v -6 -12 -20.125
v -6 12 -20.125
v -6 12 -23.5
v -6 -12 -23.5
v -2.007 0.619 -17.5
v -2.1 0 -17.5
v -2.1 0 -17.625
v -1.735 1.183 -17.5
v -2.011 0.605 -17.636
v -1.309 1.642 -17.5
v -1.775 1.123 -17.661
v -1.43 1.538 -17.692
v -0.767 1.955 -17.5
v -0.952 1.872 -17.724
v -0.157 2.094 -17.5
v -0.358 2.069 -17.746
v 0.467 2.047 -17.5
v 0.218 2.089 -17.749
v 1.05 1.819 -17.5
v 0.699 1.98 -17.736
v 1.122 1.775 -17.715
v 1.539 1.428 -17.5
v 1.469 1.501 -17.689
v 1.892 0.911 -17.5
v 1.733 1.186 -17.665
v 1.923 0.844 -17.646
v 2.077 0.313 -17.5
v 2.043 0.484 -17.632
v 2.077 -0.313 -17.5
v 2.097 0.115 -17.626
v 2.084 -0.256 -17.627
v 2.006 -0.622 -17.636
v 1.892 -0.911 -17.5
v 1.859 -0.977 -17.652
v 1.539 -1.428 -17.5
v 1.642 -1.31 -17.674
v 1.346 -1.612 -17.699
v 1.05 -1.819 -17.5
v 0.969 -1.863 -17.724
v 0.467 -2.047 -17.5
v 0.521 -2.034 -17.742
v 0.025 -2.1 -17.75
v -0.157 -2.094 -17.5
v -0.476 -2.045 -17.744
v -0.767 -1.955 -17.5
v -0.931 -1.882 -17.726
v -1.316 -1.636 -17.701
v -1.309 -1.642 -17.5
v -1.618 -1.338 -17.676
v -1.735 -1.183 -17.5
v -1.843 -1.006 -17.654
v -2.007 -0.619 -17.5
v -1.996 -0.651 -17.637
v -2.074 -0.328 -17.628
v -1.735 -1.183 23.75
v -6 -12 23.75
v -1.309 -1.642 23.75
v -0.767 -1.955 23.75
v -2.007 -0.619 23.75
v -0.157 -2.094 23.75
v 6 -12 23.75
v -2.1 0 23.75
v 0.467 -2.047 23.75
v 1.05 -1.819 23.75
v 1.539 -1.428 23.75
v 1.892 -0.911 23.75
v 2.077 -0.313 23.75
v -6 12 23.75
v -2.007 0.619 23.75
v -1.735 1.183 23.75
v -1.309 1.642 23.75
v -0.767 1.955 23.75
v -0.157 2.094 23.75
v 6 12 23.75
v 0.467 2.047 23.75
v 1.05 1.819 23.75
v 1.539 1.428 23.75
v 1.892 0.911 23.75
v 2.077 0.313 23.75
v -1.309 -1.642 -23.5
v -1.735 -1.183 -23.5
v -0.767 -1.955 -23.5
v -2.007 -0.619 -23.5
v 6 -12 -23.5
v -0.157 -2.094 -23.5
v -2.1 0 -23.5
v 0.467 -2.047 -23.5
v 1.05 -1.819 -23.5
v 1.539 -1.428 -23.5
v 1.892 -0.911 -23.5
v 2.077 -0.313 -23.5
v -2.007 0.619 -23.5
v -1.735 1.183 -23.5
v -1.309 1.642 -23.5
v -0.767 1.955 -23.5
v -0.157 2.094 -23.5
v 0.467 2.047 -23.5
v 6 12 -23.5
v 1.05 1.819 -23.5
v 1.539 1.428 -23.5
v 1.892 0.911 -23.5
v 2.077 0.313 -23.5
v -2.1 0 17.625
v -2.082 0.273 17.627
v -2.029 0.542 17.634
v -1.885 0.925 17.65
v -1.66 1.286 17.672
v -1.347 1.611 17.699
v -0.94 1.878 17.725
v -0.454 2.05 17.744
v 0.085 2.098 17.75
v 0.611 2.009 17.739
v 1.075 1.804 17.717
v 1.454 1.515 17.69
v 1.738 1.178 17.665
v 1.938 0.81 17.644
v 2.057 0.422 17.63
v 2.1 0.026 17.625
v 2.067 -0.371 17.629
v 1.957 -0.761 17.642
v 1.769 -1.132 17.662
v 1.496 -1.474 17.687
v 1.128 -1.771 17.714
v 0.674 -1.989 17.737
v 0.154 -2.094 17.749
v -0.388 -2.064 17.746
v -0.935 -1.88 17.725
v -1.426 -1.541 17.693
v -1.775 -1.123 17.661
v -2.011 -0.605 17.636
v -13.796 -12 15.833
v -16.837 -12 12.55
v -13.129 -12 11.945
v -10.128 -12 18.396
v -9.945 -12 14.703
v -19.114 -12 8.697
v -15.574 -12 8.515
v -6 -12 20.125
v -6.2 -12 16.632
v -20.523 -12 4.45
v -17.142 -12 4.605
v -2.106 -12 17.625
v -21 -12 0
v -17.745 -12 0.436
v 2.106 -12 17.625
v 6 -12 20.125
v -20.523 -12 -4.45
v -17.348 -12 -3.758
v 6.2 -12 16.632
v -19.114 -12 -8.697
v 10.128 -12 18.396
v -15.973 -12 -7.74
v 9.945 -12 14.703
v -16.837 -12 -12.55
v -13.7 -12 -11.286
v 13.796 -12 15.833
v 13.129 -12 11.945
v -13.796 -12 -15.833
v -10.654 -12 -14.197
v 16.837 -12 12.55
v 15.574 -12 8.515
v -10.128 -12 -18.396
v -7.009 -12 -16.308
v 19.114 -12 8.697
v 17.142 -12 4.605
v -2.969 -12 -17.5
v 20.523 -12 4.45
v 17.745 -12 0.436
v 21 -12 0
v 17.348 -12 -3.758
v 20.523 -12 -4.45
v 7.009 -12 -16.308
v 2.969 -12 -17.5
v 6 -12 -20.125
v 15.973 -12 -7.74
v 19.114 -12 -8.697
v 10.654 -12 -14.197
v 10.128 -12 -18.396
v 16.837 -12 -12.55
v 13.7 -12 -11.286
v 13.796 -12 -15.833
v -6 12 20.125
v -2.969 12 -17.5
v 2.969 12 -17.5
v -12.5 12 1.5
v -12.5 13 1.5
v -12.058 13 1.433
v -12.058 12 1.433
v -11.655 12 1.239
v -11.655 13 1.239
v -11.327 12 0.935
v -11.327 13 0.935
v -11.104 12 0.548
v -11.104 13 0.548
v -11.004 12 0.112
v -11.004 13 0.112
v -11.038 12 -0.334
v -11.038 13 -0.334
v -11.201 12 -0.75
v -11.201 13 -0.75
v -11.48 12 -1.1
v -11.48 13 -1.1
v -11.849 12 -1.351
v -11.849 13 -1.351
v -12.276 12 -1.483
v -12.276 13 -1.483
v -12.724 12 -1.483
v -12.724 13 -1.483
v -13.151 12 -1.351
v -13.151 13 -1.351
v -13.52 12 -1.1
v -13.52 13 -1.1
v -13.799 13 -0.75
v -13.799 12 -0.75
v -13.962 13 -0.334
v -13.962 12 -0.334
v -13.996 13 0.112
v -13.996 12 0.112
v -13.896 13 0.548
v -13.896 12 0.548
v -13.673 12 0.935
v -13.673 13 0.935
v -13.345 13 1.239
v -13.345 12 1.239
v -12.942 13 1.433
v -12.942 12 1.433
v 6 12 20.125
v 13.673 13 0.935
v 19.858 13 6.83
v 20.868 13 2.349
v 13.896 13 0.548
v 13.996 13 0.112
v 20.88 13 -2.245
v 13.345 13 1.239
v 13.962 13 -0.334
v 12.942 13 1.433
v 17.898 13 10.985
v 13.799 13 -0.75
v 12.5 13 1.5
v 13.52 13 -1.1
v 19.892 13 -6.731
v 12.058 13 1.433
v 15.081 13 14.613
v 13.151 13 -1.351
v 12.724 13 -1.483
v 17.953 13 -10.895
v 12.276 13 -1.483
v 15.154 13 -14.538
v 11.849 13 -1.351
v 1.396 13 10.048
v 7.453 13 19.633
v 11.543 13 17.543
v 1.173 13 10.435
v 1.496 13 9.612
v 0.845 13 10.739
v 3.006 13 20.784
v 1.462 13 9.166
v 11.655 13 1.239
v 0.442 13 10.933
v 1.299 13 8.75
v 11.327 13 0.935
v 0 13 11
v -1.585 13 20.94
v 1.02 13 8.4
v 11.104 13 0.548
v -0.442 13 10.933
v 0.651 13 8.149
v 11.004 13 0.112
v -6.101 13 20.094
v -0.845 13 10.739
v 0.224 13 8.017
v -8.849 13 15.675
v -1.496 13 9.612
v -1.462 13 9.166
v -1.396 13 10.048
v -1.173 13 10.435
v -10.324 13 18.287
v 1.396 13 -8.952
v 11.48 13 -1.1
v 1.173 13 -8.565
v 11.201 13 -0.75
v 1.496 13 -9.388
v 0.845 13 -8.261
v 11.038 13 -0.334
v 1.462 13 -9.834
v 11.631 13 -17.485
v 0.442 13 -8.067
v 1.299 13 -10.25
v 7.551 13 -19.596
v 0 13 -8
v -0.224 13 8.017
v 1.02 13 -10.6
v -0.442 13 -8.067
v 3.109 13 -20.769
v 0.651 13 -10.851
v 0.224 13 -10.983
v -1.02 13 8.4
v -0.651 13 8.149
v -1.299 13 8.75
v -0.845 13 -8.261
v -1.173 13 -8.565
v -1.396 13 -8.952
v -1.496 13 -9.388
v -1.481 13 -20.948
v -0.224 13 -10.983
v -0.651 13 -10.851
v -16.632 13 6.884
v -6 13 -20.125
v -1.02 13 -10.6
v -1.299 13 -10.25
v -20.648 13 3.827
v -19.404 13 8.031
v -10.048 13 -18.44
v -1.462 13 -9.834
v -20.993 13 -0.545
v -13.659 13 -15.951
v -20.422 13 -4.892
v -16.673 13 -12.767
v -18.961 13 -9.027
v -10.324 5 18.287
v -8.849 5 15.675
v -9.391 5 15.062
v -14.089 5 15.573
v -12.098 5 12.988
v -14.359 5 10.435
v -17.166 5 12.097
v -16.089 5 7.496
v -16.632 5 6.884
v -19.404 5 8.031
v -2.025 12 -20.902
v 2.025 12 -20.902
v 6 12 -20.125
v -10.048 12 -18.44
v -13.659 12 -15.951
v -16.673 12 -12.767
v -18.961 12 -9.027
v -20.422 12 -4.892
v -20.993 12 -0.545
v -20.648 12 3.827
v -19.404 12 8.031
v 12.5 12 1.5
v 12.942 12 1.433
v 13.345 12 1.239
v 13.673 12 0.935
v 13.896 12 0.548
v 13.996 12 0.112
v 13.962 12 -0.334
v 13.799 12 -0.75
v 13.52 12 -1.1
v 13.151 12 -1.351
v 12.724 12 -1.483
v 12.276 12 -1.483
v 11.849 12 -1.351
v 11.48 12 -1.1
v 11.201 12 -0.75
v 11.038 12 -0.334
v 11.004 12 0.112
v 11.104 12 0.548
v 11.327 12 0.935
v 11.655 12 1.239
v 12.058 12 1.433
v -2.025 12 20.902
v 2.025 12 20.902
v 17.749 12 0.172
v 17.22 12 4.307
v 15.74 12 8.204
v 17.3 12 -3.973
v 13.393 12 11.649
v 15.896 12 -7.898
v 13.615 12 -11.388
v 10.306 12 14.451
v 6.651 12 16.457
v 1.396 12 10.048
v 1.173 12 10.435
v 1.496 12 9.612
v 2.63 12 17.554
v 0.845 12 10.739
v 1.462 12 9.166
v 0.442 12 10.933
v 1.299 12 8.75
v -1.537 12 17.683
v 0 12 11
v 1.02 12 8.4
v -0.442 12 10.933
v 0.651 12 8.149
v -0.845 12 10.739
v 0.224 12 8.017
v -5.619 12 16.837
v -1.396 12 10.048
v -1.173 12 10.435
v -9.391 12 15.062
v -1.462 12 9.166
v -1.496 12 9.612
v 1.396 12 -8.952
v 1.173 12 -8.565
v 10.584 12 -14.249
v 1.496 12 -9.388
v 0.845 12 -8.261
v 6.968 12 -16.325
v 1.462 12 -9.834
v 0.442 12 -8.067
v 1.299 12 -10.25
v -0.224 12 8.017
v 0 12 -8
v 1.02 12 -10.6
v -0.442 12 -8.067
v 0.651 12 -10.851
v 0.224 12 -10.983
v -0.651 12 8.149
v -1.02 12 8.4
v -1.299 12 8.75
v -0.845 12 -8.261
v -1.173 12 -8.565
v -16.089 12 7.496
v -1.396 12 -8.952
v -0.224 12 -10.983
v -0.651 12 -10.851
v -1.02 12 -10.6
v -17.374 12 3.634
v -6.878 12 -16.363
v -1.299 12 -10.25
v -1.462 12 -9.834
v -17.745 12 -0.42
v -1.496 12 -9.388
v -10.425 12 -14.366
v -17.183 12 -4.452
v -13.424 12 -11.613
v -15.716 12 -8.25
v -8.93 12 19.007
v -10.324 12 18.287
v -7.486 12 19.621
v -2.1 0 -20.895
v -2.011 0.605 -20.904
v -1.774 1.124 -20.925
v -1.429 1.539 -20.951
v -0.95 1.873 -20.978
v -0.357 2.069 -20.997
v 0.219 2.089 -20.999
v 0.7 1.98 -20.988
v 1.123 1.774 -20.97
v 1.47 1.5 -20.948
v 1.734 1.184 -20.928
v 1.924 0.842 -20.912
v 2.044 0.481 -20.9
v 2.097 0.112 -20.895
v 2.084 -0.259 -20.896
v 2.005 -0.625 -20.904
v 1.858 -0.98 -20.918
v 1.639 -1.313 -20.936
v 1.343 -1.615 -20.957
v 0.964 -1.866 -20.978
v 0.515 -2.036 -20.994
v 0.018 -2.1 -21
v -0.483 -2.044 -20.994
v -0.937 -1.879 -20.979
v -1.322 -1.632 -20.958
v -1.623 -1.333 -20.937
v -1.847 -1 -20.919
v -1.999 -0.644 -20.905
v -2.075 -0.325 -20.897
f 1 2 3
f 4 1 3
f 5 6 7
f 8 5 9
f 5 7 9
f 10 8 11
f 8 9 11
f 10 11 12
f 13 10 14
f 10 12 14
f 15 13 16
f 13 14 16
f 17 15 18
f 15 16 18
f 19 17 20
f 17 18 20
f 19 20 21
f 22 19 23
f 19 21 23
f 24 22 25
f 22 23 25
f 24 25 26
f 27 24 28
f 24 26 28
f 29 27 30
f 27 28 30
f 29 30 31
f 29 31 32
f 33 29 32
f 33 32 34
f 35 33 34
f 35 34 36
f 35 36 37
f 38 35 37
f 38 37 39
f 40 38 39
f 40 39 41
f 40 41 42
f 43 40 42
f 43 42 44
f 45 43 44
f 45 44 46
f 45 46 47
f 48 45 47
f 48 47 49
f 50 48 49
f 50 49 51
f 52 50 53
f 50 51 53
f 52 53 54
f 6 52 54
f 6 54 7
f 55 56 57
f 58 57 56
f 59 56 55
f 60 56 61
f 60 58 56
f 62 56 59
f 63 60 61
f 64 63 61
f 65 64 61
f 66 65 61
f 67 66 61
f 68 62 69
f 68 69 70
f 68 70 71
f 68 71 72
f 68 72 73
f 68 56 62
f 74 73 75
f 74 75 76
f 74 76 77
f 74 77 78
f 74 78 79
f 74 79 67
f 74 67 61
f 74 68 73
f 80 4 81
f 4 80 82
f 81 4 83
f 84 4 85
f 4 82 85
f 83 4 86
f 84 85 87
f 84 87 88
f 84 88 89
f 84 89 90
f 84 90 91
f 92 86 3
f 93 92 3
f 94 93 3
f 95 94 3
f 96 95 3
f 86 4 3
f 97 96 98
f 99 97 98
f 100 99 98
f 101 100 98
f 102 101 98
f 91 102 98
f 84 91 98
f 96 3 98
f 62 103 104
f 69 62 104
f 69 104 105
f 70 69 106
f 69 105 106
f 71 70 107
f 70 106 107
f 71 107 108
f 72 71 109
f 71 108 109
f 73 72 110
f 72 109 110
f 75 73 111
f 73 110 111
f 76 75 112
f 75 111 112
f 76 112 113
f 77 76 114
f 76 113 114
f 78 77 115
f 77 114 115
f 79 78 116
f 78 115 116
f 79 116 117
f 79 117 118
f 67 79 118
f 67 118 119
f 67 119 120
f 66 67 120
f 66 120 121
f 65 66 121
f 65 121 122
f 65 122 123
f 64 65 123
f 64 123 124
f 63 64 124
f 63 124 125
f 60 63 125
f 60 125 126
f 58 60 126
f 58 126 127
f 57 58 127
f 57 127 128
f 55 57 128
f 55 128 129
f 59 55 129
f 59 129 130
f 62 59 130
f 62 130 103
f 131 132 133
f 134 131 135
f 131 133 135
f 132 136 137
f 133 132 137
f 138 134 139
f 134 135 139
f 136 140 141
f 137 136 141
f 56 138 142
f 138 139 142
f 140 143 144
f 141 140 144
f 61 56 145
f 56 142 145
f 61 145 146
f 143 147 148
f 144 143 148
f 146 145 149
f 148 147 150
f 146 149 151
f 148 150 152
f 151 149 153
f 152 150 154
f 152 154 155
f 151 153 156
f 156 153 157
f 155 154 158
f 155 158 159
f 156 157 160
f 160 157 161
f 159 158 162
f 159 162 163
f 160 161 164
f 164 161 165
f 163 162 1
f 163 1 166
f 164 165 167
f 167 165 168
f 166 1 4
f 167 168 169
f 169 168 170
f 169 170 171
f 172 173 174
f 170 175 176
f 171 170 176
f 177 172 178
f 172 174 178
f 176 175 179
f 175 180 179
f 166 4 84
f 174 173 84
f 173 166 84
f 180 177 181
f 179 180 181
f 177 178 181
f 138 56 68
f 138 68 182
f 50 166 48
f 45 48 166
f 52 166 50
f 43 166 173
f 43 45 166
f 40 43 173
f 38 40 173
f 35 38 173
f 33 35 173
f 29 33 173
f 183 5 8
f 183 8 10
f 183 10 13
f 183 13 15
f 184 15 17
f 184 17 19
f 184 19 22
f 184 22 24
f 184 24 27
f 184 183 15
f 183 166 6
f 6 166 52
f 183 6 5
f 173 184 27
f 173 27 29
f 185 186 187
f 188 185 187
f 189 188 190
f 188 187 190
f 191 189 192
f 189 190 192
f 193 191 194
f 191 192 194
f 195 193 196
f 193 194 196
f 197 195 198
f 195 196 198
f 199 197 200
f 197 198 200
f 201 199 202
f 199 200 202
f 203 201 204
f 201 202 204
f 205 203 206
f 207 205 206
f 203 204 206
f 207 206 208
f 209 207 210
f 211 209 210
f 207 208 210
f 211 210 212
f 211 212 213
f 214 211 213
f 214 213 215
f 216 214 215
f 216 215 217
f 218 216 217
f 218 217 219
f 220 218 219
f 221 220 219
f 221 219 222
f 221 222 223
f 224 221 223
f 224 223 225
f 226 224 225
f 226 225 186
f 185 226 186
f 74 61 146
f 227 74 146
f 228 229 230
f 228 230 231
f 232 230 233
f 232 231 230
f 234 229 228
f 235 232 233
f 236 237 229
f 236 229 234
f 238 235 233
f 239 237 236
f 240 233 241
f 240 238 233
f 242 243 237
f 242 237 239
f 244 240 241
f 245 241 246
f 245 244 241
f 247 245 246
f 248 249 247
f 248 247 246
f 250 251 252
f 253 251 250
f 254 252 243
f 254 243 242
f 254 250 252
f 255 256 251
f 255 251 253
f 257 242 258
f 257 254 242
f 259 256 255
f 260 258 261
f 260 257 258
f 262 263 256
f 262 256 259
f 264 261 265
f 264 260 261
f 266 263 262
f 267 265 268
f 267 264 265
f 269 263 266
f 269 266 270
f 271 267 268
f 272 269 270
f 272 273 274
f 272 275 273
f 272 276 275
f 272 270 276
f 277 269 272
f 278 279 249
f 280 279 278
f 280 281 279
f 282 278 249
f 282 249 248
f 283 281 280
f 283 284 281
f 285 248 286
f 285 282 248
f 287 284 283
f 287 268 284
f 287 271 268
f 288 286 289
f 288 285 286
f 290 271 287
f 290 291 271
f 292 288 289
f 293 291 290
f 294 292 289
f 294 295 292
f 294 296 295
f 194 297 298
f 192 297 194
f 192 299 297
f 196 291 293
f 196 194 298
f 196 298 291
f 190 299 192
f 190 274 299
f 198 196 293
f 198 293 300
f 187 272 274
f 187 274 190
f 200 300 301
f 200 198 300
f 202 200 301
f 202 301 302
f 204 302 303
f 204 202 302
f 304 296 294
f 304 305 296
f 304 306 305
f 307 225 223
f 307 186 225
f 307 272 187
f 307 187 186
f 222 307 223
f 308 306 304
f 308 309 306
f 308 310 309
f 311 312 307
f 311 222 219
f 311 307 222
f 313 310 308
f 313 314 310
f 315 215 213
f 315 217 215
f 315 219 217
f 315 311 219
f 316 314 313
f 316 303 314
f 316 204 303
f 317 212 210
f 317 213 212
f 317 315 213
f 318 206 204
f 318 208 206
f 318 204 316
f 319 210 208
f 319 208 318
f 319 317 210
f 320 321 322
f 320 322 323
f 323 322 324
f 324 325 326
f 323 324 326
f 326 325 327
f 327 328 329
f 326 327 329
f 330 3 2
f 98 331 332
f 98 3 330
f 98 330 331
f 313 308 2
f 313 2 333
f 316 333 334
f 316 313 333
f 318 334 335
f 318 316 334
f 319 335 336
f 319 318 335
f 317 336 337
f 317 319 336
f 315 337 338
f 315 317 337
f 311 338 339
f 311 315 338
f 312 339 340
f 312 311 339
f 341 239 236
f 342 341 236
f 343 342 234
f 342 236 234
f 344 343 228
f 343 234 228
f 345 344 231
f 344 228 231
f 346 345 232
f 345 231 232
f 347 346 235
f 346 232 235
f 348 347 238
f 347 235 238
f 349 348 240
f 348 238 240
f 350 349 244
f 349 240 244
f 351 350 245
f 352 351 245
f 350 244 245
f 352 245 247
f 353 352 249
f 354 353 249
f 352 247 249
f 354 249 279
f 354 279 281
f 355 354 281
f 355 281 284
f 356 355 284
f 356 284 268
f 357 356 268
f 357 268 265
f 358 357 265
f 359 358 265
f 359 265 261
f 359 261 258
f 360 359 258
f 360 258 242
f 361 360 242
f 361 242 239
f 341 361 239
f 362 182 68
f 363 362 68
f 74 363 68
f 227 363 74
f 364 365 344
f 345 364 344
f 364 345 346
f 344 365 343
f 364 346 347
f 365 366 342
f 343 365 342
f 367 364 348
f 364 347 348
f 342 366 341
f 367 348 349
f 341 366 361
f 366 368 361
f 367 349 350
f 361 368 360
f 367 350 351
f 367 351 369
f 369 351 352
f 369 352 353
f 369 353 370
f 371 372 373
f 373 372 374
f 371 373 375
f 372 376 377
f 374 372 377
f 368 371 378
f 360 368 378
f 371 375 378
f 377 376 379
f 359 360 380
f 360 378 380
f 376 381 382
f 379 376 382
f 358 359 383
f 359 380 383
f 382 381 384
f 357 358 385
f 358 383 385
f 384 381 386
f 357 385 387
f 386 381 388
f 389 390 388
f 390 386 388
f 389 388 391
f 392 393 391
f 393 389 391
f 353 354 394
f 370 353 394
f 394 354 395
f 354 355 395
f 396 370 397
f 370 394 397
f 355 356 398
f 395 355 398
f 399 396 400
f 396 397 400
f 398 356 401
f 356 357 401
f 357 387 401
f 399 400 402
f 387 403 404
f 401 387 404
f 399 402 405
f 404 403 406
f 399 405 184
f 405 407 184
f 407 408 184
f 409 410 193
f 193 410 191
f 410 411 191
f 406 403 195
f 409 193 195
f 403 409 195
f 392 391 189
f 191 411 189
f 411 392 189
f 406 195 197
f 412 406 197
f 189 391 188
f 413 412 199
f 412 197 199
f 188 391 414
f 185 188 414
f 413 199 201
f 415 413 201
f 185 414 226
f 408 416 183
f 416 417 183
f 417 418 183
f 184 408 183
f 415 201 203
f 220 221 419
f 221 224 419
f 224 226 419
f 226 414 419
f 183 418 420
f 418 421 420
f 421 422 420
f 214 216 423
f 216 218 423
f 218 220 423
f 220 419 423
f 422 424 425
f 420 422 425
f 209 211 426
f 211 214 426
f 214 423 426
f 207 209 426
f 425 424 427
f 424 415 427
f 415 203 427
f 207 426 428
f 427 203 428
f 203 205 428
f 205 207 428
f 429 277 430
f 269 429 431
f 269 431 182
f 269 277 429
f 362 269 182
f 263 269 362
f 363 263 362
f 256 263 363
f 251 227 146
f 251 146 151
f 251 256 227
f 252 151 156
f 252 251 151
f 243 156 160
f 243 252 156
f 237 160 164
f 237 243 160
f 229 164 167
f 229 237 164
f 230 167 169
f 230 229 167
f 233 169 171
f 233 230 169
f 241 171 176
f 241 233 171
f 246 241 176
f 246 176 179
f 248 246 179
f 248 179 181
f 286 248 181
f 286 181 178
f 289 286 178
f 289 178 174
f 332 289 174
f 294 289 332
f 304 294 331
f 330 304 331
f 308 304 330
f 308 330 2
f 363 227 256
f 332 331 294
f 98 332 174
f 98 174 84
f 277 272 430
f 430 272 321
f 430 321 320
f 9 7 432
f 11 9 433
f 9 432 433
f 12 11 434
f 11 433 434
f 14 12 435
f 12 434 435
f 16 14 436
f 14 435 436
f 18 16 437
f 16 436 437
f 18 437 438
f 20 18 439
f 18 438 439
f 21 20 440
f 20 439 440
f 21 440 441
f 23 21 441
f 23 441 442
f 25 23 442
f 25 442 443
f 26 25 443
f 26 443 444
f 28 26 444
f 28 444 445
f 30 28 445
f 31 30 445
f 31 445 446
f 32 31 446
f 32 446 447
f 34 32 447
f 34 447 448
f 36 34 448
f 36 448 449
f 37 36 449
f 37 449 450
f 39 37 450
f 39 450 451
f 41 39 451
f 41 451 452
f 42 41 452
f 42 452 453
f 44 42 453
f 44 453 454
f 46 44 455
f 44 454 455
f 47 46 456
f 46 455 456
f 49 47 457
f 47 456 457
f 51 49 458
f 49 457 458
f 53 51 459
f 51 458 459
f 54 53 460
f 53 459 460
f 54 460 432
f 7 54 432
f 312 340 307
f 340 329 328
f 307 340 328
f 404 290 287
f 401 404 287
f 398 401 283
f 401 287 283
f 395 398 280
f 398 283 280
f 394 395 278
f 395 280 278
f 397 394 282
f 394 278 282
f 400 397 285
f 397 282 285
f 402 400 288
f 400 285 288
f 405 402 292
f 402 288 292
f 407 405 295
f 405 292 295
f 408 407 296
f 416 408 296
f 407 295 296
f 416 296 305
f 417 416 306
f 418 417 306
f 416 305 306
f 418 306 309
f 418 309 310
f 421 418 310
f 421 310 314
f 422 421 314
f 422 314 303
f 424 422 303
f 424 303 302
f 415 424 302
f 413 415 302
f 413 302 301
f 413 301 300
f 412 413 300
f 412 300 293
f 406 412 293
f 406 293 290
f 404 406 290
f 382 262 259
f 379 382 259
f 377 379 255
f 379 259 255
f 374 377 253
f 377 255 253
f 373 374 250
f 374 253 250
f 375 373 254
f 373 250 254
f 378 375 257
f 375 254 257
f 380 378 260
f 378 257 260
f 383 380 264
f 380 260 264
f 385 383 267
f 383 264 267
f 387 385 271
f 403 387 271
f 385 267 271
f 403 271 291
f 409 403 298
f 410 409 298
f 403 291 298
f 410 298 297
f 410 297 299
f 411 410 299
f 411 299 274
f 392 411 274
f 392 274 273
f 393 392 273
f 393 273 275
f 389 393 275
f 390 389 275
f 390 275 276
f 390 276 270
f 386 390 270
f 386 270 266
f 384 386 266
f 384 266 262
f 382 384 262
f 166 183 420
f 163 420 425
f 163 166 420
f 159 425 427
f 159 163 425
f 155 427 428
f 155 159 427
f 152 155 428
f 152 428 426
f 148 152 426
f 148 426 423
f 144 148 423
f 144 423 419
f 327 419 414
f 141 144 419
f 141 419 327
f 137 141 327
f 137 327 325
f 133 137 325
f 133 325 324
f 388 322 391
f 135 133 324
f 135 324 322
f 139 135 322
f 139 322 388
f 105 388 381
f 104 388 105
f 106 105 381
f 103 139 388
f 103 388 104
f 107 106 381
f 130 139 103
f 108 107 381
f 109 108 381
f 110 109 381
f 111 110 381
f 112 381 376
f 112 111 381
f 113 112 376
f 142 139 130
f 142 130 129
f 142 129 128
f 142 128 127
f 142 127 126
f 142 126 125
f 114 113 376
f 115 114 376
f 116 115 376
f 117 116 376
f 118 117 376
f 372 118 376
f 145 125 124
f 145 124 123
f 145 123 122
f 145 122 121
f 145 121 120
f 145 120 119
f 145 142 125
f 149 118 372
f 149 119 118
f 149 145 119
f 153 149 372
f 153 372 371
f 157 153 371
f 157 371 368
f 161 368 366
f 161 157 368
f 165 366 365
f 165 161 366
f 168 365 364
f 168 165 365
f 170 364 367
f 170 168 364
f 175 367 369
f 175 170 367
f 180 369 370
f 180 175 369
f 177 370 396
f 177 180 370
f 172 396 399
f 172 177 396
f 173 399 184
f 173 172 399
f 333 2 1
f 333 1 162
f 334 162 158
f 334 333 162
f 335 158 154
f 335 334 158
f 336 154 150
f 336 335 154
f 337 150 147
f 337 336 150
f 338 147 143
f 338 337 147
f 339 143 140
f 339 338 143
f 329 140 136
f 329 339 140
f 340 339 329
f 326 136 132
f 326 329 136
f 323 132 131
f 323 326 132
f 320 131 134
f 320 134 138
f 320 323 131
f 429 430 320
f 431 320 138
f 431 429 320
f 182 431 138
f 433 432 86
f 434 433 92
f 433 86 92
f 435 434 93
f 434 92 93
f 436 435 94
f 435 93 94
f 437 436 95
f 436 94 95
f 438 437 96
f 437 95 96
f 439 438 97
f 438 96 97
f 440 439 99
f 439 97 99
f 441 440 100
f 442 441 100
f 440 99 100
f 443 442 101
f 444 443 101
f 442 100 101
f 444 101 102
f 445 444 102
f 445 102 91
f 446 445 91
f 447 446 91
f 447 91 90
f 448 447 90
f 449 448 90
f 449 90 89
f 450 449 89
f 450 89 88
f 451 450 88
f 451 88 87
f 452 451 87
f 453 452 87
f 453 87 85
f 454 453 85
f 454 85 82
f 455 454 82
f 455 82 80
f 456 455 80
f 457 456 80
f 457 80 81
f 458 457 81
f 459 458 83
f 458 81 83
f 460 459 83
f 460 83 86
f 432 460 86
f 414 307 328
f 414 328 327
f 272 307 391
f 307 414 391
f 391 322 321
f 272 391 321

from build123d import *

# Parameters (mm, degrees)
SKETCH1_R           = 21
SKETCH1_R_2         = 17.75
BOSS_EXTRUDE2_DEPTH = 12
SKETCH5_W           = 12
SKETCH5_H           = 6
BOSS_EXTRUDE7_DEPTH = 12
SKETCH6_W           = 12
SKETCH6_H           = 6
BOSS_EXTRUDE8_DEPTH = 12
SKETCH7_R           = 2.1
CUT_EXTRUDE1_DEPTH  = 54.080716838
BOSS_EXTRUDE9_START = 1
SKETCH8_R           = 21
BOSS_EXTRUDE9_DEPTH = 1
CUT_EXTRUDE2_REACH  = 42.374
SKETCH9_R           = 1.5
CUT_EXTRUDE6_START  = 5
CUT_EXTRUDE6_DEPTH  = 30.2645955


with BuildPart() as part:
    # Sketch1 → Boss-Extrude2 (new, symmetric)
    with BuildSketch(Plane(origin=(0, 0, 0), x_dir=(1, 0, 0), z_dir=(0, 1, 0))):
        Circle(SKETCH1_R)
        Circle(SKETCH1_R_2, mode=Mode.SUBTRACT)
    extrude(amount=BOSS_EXTRUDE2_DEPTH, both=True)

    # Sketch6 → Boss-Extrude8 (add, symmetric)
    with BuildSketch(Plane(origin=(0, 0, 0), x_dir=(1, 0, 0), z_dir=(0, 1, 0))):
        with Locations((0, -20.75)):
            Rectangle(SKETCH6_W, SKETCH6_H)
    extrude(amount=BOSS_EXTRUDE8_DEPTH, both=True)


with BuildPart() as body_2:
    # Sketch5 → Boss-Extrude7 (new, symmetric)
    with BuildSketch(Plane(origin=(0, 0, 0), x_dir=(1, 0, 0), z_dir=(0, 1, 0))):
        with Locations((0, 20.5)):
            Rectangle(SKETCH5_W, SKETCH5_H)
    extrude(amount=BOSS_EXTRUDE7_DEPTH, both=True)


with BuildPart() as cut_extrude1_tool:
    # Sketch7 → Cut-Extrude1 (new, through all)
    with BuildSketch(Plane(origin=(0, 0, -23.5), x_dir=(-1, 0, 0), z_dir=(0, 0, -1))):
        Circle(SKETCH7_R)
    extrude(amount=-CUT_EXTRUDE1_DEPTH)


with BuildPart() as part_1:
    add(part.part)

    # Cut-Extrude1: cut by cut_extrude1_tool
    add(cut_extrude1_tool.part, mode=Mode.SUBTRACT)



with BuildPart() as body_2_1:
    add(body_2.part)

    # Cut-Extrude1: cut by cut_extrude1_tool
    add(cut_extrude1_tool.part, mode=Mode.SUBTRACT)


with BuildPart() as part_2:
    add(part_1.part)

    add(body_2_1.part)  # Boss-Extrude9 merges body 2
    # Sketch8 → Boss-Extrude9 (add)
    with BuildSketch(Plane(origin=(0, 12, 0), x_dir=(1, 0, 0), z_dir=(0, 1, 0)).offset(BOSS_EXTRUDE9_START)):
        Circle(SKETCH8_R)
    extrude(amount=-BOSS_EXTRUDE9_DEPTH)

    # Sketch9 → Cut-Extrude2 (cut, up to next)
    with BuildSketch(Plane(origin=(0, 13, 0), x_dir=(1, 0, 0), z_dir=(0, 1, 0)), mode=Mode.PRIVATE) as cut_extrude2_sk1:
        with Locations((0, 9.5)):
            Circle(SKETCH9_R)
    cut_extrude2_tool1 = extrude(cut_extrude2_sk1.sketch, amount=-CUT_EXTRUDE2_REACH, mode=Mode.PRIVATE) & part_2.part
    # Sketch9 → Cut-Extrude2 (cut, up to next)
    with BuildSketch(Plane(origin=(0, 13, 0), x_dir=(1, 0, 0), z_dir=(0, 1, 0)), mode=Mode.PRIVATE) as cut_extrude2_sk2:
        with Locations((0, -9.5)):
            Circle(SKETCH9_R)
    cut_extrude2_tool2 = extrude(cut_extrude2_sk2.sketch, amount=-CUT_EXTRUDE2_REACH, mode=Mode.PRIVATE) & part_2.part
    # Sketch9 → Cut-Extrude2 (cut, up to next)
    with BuildSketch(Plane(origin=(0, 13, 0), x_dir=(1, 0, 0), z_dir=(0, 1, 0)), mode=Mode.PRIVATE) as cut_extrude2_sk3:
        with Locations((-12.5, 0)):
            Circle(SKETCH9_R)
    cut_extrude2_tool3 = extrude(cut_extrude2_sk3.sketch, amount=-CUT_EXTRUDE2_REACH, mode=Mode.PRIVATE) & part_2.part
    # Sketch9 → Cut-Extrude2 (cut, up to next)
    with BuildSketch(Plane(origin=(0, 13, 0), x_dir=(1, 0, 0), z_dir=(0, 1, 0)), mode=Mode.PRIVATE) as cut_extrude2_sk4:
        with Locations((12.5, 0)):
            Circle(SKETCH9_R)
    cut_extrude2_tool4 = extrude(cut_extrude2_sk4.sketch, amount=-CUT_EXTRUDE2_REACH, mode=Mode.PRIVATE) & part_2.part
    add(cut_extrude2_tool1.solids().sort_by_distance((0, 13, -9.5))[0], mode=Mode.SUBTRACT)
    add(cut_extrude2_tool2.solids().sort_by_distance((0, 13, 9.5))[0], mode=Mode.SUBTRACT)
    add(cut_extrude2_tool3.solids().sort_by_distance((-12.5, 13, 0))[0], mode=Mode.SUBTRACT)
    add(cut_extrude2_tool4.solids().sort_by_distance((12.5, 13, 0))[0], mode=Mode.SUBTRACT)

    # Sketch12 → Cut-Extrude6 (cut, through all)
    with BuildSketch(Plane(origin=(0, 0, 0), x_dir=(1, 0, 0), z_dir=(0, 1, 0)).offset(CUT_EXTRUDE6_START)):
        with BuildLine():
            Line((-19.403691202, -8.030987969), (-16.631735316, -6.883703973))
            Line((-16.631735316, -6.883703973), (-8.848918103, -15.674713663))
            Line((-8.848918103, -15.674713663), (-10.323737787, -18.28716594))
            ThreePointArc((-10.323737787, -18.28716594), (-15.723463525, -13.920226104), (-19.403691202, -8.030987969))
        make_face()
    extrude(amount=CUT_EXTRUDE6_DEPTH, mode=Mode.SUBTRACT)


solid = part_2.part
